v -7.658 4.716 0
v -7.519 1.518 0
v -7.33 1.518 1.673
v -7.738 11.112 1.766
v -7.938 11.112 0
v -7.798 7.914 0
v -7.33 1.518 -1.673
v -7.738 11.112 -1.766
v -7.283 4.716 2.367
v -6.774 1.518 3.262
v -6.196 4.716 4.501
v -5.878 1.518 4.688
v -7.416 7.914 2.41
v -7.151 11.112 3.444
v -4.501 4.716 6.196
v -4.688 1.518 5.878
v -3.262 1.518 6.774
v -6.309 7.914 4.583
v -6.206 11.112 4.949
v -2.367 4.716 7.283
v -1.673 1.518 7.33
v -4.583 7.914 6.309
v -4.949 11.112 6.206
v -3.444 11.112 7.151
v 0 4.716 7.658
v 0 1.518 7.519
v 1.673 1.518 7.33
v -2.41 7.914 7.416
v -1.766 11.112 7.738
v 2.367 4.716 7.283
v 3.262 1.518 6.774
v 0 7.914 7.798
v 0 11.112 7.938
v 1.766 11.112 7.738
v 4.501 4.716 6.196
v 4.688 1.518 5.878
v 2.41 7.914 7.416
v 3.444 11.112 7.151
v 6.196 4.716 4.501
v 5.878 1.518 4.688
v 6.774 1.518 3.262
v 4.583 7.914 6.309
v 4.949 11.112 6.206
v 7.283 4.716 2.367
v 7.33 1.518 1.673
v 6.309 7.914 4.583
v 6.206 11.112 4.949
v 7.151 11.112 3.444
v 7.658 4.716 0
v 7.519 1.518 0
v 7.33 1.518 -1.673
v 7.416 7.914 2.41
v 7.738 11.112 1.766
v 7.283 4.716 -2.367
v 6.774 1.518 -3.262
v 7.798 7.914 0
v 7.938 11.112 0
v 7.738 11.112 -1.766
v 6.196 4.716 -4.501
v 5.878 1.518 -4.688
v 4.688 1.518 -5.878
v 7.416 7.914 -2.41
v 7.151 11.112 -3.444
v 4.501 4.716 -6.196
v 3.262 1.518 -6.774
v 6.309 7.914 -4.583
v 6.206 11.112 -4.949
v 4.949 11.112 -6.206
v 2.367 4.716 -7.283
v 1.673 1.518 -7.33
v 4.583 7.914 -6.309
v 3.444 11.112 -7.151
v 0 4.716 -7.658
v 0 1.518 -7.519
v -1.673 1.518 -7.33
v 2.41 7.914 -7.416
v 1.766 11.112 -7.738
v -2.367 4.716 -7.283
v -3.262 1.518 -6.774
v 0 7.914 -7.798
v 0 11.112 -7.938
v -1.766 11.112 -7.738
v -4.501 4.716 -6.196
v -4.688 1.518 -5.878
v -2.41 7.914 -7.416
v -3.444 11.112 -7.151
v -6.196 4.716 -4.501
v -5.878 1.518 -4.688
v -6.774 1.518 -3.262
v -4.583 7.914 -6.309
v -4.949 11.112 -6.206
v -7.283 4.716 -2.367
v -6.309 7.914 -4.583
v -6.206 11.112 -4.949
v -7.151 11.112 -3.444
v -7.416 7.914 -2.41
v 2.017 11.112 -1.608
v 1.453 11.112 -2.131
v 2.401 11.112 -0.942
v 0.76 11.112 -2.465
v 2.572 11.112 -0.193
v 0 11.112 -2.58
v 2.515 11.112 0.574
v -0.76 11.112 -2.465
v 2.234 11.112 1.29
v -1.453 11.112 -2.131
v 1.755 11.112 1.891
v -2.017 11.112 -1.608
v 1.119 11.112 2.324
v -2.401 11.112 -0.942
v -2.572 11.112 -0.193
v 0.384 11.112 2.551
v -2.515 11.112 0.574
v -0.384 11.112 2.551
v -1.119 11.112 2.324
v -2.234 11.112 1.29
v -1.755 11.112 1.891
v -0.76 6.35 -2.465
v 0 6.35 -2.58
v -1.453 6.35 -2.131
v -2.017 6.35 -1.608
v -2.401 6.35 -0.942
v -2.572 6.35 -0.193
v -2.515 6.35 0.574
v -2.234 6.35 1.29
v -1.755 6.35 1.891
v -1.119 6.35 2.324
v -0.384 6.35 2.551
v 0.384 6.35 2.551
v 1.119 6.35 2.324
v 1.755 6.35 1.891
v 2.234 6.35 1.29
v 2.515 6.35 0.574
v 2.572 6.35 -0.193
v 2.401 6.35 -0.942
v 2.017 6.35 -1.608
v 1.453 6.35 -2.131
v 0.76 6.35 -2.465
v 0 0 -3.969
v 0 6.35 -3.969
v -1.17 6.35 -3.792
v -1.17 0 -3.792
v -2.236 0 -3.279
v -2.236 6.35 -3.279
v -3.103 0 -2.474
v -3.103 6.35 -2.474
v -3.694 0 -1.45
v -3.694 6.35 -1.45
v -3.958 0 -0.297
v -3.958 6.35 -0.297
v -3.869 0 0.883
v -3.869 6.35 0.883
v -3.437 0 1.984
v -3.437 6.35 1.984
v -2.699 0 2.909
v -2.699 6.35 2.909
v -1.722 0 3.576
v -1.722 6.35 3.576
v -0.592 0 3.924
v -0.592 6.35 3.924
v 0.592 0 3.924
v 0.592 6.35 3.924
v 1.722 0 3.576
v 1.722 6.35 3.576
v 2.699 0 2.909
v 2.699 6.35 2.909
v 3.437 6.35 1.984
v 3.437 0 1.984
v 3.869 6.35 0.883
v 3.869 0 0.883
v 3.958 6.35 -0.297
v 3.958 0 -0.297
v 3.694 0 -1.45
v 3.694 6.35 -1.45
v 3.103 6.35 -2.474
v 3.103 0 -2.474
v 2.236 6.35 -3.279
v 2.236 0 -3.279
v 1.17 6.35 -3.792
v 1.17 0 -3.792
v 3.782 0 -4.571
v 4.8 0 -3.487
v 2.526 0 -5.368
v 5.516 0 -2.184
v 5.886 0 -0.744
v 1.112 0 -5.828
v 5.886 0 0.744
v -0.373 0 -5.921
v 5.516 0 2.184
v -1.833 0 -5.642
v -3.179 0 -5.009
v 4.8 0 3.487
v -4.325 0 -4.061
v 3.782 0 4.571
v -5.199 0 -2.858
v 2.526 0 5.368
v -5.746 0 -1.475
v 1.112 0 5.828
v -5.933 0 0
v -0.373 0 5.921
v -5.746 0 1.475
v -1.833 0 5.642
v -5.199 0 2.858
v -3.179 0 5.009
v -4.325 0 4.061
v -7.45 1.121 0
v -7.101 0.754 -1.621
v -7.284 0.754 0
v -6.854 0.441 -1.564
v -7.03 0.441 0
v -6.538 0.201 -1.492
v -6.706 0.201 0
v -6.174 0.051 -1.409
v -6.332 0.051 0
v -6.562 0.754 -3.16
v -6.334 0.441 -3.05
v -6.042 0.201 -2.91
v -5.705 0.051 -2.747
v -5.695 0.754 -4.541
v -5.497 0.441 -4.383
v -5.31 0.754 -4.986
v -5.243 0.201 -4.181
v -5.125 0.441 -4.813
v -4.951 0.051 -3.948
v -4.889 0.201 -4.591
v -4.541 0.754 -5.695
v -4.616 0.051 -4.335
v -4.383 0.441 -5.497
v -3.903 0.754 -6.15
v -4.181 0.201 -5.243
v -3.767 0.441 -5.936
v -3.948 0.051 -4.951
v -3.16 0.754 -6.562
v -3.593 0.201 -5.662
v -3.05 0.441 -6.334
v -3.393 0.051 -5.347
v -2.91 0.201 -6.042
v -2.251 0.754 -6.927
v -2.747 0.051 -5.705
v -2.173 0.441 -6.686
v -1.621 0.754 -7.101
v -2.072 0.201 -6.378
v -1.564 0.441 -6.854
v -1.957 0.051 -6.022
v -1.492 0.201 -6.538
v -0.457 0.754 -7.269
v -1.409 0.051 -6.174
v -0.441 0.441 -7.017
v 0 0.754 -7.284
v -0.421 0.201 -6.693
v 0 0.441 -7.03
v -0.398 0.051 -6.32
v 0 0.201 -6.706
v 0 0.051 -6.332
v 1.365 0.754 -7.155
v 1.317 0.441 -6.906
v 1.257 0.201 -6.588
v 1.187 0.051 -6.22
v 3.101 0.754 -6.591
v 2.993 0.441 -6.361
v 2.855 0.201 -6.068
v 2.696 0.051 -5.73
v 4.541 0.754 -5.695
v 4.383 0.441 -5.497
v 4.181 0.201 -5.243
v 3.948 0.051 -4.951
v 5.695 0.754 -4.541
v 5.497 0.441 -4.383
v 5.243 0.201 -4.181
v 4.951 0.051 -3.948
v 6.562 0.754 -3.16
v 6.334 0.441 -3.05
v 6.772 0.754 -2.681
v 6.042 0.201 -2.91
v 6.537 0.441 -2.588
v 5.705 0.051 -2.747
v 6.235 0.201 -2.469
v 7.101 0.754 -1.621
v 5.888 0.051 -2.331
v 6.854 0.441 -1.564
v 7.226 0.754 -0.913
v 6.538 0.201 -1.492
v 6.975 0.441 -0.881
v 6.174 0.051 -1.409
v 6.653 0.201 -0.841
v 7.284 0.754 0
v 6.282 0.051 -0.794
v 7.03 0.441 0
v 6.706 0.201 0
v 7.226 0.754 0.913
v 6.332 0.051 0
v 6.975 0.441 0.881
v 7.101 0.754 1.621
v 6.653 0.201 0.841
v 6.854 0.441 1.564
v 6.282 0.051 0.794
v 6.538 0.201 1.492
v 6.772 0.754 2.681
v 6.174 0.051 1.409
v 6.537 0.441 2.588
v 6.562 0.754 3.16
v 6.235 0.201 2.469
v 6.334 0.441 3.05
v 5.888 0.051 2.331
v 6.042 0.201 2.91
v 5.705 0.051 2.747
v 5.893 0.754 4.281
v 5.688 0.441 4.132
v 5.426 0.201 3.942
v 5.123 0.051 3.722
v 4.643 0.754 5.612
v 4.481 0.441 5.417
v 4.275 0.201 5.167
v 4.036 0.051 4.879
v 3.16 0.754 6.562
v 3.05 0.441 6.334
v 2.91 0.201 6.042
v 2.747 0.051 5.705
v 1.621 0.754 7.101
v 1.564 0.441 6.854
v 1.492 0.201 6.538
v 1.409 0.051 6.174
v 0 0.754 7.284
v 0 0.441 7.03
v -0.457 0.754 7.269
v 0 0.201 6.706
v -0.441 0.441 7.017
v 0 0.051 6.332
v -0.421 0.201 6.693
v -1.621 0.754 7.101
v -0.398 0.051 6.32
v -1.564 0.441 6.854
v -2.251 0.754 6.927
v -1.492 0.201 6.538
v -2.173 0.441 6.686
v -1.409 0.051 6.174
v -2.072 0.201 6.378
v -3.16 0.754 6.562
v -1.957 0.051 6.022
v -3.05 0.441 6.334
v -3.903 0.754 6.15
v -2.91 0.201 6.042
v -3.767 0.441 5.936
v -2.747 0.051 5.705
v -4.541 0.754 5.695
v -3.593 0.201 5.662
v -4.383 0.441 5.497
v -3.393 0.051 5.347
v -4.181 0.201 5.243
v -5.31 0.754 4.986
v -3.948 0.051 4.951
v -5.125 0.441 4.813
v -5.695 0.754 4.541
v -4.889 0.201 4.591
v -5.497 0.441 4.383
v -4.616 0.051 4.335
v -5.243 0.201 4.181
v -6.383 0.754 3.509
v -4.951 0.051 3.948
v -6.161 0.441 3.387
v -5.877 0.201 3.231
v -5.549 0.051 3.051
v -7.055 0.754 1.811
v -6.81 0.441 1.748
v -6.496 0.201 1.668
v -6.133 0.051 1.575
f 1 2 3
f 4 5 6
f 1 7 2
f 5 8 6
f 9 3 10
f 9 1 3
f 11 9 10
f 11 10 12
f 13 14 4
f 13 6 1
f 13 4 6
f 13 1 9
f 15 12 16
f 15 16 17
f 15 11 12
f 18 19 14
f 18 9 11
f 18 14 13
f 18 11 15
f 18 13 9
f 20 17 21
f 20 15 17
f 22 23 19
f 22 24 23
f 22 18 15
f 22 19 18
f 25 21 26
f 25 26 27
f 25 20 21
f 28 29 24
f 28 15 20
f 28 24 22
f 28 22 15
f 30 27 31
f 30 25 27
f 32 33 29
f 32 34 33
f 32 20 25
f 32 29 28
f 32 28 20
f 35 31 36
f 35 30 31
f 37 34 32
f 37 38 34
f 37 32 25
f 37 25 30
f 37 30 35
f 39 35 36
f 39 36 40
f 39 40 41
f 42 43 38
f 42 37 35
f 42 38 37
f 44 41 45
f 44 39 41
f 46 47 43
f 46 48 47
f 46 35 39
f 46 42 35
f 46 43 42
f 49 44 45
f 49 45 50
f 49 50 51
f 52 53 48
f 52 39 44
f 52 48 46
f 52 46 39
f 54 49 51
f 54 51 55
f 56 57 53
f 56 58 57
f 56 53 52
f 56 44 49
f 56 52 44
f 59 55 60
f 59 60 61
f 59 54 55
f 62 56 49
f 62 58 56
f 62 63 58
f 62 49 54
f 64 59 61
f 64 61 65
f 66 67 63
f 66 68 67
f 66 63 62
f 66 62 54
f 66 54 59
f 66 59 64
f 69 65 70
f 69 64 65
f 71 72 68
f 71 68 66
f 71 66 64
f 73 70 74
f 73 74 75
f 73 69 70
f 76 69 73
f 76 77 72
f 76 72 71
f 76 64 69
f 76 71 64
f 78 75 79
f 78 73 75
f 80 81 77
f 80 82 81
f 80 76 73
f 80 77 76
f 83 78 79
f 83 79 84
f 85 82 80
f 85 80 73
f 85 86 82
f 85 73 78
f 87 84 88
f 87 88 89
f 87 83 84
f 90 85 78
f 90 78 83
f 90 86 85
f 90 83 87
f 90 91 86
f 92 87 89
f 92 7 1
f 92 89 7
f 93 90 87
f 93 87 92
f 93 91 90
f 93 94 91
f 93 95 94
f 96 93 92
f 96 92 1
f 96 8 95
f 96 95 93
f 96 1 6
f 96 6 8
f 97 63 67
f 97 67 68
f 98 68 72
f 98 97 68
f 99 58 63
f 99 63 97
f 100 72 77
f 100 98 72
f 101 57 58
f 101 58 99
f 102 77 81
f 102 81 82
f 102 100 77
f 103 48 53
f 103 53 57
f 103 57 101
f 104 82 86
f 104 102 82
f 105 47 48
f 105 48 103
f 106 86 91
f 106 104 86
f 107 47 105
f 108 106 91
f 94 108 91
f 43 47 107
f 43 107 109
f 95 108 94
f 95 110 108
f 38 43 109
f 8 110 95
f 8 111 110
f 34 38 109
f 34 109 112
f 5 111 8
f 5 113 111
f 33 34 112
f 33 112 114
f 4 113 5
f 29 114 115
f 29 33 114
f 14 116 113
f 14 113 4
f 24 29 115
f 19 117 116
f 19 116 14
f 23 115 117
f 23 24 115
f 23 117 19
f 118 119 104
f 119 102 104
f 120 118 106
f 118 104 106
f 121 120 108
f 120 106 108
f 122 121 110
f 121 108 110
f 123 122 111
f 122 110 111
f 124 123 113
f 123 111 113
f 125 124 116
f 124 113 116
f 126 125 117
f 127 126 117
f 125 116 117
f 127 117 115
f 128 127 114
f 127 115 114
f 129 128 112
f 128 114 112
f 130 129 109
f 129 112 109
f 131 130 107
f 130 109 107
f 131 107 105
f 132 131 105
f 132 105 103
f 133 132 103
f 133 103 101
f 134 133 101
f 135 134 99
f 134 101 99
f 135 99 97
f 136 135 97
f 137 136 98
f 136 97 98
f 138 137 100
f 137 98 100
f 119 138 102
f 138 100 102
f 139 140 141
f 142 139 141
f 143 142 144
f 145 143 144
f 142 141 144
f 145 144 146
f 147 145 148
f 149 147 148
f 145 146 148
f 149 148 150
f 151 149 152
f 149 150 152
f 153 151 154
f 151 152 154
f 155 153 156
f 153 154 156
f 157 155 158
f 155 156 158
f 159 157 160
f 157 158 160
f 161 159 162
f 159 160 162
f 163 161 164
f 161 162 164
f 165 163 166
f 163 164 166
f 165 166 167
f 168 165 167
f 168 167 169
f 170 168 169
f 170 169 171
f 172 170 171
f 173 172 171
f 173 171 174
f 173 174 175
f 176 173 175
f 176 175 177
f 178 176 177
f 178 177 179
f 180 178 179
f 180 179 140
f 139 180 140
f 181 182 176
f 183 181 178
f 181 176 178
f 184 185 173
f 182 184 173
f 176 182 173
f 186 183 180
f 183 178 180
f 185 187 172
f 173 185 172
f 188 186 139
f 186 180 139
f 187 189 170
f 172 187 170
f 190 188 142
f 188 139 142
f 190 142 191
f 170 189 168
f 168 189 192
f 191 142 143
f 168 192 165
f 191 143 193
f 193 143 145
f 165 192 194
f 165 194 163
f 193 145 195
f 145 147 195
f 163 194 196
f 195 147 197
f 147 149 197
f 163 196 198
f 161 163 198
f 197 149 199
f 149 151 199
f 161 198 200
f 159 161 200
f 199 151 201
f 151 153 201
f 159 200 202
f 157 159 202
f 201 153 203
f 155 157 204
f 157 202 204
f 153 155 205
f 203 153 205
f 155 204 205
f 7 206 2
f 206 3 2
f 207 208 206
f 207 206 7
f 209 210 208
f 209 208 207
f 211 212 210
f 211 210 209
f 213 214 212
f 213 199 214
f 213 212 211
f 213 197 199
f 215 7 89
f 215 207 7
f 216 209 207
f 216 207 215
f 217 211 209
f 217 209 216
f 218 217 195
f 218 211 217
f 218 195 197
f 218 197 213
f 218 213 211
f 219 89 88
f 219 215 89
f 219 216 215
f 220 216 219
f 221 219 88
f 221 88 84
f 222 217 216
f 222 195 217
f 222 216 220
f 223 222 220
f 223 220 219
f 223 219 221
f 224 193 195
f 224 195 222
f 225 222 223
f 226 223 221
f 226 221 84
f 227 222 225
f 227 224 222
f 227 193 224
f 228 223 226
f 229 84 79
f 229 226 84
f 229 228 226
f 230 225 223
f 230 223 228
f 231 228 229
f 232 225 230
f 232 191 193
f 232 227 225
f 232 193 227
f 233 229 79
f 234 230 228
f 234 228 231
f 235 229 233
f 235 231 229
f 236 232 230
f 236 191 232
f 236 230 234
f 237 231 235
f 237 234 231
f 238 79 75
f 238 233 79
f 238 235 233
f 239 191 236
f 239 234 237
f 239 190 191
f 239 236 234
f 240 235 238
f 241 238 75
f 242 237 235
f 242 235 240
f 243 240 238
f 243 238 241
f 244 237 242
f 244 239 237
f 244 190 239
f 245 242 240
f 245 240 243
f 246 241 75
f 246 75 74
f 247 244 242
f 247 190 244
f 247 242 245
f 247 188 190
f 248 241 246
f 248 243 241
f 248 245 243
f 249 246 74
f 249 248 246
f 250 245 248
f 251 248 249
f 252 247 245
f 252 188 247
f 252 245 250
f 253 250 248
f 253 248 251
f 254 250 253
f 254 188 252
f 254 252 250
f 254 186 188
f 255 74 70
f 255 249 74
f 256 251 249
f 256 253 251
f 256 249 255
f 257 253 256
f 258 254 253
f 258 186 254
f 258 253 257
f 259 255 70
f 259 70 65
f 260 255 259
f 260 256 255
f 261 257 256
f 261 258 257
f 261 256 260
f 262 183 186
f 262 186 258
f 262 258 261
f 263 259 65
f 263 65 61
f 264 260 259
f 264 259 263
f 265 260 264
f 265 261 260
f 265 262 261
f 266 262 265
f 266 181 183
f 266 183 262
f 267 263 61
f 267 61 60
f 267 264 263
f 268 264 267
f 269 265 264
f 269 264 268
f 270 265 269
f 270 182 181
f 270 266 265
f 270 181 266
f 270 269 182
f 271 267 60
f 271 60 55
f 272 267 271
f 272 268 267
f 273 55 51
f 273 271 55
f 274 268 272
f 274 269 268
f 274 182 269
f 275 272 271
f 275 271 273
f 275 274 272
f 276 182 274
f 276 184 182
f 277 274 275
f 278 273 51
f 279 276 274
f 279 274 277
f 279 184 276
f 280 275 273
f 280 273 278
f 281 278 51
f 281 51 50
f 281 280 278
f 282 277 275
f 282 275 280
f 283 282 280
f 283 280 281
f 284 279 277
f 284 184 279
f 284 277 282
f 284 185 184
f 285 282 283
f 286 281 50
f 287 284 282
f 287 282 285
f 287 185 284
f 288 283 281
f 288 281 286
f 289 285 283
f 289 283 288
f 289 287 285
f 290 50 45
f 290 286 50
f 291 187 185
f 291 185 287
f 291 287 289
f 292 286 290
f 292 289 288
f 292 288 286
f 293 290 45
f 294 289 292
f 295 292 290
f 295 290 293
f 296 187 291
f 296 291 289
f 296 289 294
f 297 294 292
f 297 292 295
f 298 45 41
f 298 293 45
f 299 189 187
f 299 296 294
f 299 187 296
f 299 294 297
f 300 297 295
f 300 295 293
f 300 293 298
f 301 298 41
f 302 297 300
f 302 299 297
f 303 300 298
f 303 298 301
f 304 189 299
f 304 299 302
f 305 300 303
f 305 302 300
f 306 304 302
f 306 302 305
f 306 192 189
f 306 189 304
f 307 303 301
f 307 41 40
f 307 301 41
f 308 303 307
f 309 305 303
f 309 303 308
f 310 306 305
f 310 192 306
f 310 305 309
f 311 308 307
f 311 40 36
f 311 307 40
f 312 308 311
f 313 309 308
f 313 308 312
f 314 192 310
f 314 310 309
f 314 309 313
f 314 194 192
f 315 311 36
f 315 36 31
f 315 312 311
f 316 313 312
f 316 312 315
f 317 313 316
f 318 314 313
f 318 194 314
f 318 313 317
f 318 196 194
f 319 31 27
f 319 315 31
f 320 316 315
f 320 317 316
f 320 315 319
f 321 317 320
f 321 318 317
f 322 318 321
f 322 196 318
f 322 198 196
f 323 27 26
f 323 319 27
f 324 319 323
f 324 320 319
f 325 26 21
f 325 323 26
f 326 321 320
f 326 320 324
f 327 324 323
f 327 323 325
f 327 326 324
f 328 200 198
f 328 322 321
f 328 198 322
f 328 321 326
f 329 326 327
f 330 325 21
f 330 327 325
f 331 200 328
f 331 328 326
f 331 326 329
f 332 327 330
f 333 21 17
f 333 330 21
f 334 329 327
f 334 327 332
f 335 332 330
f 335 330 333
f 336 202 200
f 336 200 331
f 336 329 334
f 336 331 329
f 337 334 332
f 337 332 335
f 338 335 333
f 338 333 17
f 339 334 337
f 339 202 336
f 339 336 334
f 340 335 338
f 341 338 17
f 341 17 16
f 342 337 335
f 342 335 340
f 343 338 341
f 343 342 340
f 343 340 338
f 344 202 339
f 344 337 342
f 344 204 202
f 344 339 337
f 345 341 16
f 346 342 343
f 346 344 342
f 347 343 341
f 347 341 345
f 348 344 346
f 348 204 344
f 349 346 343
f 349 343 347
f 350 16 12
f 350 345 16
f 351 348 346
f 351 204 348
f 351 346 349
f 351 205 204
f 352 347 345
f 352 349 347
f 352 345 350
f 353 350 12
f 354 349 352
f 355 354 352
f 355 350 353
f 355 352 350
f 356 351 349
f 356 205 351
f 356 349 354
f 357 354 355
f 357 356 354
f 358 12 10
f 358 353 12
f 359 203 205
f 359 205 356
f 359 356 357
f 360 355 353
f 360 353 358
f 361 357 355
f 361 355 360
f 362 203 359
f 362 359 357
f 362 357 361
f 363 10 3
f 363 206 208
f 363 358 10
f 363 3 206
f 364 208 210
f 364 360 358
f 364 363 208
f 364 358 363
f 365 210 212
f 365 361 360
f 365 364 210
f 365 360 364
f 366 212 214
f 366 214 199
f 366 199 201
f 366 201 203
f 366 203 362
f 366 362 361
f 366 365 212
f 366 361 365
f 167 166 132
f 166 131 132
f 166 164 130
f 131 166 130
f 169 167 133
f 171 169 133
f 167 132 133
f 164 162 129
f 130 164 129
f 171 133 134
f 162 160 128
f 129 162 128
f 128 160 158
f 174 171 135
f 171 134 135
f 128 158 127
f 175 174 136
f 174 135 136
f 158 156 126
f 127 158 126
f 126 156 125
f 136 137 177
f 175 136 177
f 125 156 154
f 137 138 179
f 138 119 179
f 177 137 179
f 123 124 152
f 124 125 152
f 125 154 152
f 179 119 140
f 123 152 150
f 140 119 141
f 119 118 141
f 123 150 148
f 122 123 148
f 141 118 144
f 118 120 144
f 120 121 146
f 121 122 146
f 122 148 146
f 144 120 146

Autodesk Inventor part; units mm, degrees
ref_plane "YZ Plane" through (0, 0, 0) normal (1, 0, 0) x (0, 1, 0)
ref_plane "XZ Plane" through (0, 0, 0) normal (0, 1, 0) x (-1, 0, 0)
ref_plane "XY Plane" through (0, 0, 0) normal (0, 0, 1) x (1, 0, 0)
sketch "Sketch1" plane through (0, 0, 0) normal (0, 1, 0) x (-1, 0, 0)
  circle A0 centre (0, 0) radius 7.9375
  dimension "d0" = 15.875
extrude "Extrusion1" add sketch "Sketch1" along normal blind 11.1125
sketch "Sketch2" plane through (0, 0, 0) normal (0, -1, 0) x (1, 0, 0)
  point P0 (0, 0)
  point P1 (0, 0)
hole "Hole1" at (0, 0, 0) direction (0, 1, 0) diameter 5.1594 end through all counterbore diameter 7.9375 counterbore depth 6.35
draft "FaceDraft1" angle 2.5 pull direction (0, -1, 0) faces at (-7.8347, 7.4083, -1.2733) fixed edges at (7.9375, 11.1125, 0)
fillet "Fillet1" radius 1.5875 1 edges at (7.4523, 0, 0)
properties part number "roundBumper" material "Rubber"
